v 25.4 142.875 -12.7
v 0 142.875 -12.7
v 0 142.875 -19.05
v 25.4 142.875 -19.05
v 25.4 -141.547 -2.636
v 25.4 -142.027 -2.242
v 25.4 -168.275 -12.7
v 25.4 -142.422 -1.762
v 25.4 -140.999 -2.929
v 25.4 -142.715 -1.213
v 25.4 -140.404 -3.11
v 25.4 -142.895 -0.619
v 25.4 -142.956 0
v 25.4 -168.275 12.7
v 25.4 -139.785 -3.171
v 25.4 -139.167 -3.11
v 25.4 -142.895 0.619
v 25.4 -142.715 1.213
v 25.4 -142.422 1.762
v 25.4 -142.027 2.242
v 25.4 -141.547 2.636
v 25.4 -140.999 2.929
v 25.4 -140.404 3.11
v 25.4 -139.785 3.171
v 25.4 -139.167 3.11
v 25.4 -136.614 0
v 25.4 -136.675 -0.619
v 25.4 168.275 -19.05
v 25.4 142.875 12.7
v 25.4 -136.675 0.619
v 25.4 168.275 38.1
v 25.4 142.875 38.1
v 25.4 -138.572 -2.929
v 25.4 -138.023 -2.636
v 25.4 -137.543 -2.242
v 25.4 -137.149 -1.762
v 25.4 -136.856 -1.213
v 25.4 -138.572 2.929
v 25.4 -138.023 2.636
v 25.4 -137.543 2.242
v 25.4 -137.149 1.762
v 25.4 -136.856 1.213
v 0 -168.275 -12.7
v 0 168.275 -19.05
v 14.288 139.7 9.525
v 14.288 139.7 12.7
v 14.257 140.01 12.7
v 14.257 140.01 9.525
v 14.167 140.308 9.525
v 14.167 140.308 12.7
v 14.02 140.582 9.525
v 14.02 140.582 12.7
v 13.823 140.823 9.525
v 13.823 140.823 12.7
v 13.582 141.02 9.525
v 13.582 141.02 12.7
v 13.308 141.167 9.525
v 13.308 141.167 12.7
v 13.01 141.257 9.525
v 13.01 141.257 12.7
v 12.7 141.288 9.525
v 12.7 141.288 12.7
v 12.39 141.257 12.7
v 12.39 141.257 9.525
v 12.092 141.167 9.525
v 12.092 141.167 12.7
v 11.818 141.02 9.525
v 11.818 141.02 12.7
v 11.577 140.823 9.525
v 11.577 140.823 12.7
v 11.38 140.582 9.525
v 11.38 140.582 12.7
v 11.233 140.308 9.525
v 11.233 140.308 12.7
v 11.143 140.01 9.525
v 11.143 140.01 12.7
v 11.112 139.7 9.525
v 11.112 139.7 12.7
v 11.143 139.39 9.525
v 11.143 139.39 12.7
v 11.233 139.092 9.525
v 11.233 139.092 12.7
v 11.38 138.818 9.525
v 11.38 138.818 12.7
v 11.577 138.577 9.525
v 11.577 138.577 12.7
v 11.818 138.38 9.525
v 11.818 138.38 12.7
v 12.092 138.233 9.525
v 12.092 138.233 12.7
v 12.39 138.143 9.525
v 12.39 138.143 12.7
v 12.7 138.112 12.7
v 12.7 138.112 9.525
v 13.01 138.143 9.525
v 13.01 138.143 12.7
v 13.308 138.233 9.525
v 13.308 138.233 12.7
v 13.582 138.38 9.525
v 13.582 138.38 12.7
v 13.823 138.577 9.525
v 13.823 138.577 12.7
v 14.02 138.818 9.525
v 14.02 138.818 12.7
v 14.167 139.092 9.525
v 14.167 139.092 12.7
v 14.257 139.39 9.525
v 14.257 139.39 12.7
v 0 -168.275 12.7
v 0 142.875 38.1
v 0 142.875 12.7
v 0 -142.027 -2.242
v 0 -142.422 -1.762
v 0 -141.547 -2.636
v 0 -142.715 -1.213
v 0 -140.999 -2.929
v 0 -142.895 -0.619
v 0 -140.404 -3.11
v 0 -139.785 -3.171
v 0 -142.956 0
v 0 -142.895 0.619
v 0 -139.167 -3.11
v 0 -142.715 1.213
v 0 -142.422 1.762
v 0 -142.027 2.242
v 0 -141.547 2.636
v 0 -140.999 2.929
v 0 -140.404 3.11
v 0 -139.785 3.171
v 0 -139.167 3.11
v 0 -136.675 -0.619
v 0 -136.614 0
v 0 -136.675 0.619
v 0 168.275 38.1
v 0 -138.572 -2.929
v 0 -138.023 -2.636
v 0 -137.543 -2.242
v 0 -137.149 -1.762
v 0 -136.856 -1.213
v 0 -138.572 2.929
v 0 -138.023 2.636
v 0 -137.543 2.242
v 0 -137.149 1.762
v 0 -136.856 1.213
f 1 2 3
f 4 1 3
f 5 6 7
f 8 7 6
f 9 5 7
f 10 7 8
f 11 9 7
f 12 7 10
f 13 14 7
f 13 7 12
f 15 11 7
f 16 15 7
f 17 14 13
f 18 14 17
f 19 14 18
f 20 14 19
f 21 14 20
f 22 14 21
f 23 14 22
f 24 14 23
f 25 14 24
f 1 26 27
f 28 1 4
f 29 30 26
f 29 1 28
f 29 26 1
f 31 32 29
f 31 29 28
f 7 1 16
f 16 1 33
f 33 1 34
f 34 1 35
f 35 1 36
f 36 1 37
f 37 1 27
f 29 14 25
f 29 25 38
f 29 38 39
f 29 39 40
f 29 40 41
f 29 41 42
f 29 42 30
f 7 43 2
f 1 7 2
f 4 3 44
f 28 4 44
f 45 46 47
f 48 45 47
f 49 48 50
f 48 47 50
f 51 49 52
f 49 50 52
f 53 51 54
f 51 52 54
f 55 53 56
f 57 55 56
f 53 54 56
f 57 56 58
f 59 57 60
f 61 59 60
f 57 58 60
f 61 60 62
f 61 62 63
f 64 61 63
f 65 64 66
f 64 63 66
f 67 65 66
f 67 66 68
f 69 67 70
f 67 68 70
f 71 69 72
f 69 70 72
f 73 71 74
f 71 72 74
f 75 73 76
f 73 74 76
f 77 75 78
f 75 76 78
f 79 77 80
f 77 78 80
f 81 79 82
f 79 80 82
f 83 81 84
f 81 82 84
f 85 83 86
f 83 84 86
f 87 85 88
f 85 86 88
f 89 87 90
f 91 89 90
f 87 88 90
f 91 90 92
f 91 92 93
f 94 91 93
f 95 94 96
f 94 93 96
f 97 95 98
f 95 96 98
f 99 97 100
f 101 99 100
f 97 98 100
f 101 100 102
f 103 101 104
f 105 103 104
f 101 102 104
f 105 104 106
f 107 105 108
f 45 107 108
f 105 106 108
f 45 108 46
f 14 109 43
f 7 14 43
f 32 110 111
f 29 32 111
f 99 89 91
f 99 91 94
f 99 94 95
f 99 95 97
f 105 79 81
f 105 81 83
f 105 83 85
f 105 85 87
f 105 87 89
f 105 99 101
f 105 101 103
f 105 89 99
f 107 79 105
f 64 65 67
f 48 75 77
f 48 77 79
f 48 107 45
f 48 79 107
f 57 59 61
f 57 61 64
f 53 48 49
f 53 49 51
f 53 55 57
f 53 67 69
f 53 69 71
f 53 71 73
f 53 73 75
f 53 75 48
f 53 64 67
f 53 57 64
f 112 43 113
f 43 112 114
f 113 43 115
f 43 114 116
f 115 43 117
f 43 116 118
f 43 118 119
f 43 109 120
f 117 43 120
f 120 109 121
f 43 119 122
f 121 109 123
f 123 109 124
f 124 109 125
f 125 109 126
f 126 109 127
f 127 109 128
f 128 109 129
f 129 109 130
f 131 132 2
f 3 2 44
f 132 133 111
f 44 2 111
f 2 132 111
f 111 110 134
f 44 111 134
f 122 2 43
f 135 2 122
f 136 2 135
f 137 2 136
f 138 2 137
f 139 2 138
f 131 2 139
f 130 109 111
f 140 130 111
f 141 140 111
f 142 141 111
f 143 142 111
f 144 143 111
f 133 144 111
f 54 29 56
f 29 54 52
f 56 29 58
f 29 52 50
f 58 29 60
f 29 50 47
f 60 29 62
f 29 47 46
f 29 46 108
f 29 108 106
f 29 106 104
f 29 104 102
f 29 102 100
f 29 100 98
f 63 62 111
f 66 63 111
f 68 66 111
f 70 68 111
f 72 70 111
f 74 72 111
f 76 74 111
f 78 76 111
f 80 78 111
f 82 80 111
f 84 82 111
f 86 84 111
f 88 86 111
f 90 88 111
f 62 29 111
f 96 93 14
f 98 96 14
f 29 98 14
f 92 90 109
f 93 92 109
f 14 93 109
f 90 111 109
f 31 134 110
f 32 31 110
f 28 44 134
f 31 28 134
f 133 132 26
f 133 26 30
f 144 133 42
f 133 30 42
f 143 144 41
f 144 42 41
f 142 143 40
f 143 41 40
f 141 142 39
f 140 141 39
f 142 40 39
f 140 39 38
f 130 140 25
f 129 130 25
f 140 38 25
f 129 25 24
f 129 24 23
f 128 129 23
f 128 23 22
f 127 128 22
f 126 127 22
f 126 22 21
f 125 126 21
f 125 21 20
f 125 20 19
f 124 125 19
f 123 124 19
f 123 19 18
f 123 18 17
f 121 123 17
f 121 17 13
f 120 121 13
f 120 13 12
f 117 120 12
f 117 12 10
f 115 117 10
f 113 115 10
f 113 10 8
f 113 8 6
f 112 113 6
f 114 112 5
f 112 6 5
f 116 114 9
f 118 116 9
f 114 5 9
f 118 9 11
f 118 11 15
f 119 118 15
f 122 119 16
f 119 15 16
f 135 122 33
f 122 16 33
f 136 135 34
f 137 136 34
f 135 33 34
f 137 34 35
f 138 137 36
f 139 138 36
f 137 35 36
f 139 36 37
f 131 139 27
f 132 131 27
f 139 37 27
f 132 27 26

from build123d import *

# Parameters (mm, degrees)
F1_DEPTH = 25.4
F2_R     = 3.170865
F3_DEPTH = 25.401
F4_R     = 1.5875
F5_DEPTH = 3.175


with BuildPart() as f1:
    # F0 (on Right) → F1 (new body)
    with BuildSketch(Plane.YZ):
        Polygon((-168.275, -12.7), (142.875, -12.7), (142.875, -19.05), (168.275, -19.05), (168.275, -12.7), (168.275, 12.7), (168.275, 38.1), (142.875, 38.1), (142.875, 12.7), (-168.275, 12.7), align=None)
    extrude(amount=F1_DEPTH)

    # F2 (on face) → F3 (cut, through all)
    with BuildSketch(Plane.YZ.offset(25.4)):
        with Locations((-139.785126, 0)):
            Circle(F2_R)
    extrude(amount=-F3_DEPTH, mode=Mode.SUBTRACT)

    # F4 (on face) → F5 (cut)
    with BuildSketch(Plane.XY.offset(12.7)):
        with Locations((12.7, 139.7)):
            Circle(F4_R)
    extrude(amount=-F5_DEPTH, mode=Mode.SUBTRACT)


solid = f1.part
